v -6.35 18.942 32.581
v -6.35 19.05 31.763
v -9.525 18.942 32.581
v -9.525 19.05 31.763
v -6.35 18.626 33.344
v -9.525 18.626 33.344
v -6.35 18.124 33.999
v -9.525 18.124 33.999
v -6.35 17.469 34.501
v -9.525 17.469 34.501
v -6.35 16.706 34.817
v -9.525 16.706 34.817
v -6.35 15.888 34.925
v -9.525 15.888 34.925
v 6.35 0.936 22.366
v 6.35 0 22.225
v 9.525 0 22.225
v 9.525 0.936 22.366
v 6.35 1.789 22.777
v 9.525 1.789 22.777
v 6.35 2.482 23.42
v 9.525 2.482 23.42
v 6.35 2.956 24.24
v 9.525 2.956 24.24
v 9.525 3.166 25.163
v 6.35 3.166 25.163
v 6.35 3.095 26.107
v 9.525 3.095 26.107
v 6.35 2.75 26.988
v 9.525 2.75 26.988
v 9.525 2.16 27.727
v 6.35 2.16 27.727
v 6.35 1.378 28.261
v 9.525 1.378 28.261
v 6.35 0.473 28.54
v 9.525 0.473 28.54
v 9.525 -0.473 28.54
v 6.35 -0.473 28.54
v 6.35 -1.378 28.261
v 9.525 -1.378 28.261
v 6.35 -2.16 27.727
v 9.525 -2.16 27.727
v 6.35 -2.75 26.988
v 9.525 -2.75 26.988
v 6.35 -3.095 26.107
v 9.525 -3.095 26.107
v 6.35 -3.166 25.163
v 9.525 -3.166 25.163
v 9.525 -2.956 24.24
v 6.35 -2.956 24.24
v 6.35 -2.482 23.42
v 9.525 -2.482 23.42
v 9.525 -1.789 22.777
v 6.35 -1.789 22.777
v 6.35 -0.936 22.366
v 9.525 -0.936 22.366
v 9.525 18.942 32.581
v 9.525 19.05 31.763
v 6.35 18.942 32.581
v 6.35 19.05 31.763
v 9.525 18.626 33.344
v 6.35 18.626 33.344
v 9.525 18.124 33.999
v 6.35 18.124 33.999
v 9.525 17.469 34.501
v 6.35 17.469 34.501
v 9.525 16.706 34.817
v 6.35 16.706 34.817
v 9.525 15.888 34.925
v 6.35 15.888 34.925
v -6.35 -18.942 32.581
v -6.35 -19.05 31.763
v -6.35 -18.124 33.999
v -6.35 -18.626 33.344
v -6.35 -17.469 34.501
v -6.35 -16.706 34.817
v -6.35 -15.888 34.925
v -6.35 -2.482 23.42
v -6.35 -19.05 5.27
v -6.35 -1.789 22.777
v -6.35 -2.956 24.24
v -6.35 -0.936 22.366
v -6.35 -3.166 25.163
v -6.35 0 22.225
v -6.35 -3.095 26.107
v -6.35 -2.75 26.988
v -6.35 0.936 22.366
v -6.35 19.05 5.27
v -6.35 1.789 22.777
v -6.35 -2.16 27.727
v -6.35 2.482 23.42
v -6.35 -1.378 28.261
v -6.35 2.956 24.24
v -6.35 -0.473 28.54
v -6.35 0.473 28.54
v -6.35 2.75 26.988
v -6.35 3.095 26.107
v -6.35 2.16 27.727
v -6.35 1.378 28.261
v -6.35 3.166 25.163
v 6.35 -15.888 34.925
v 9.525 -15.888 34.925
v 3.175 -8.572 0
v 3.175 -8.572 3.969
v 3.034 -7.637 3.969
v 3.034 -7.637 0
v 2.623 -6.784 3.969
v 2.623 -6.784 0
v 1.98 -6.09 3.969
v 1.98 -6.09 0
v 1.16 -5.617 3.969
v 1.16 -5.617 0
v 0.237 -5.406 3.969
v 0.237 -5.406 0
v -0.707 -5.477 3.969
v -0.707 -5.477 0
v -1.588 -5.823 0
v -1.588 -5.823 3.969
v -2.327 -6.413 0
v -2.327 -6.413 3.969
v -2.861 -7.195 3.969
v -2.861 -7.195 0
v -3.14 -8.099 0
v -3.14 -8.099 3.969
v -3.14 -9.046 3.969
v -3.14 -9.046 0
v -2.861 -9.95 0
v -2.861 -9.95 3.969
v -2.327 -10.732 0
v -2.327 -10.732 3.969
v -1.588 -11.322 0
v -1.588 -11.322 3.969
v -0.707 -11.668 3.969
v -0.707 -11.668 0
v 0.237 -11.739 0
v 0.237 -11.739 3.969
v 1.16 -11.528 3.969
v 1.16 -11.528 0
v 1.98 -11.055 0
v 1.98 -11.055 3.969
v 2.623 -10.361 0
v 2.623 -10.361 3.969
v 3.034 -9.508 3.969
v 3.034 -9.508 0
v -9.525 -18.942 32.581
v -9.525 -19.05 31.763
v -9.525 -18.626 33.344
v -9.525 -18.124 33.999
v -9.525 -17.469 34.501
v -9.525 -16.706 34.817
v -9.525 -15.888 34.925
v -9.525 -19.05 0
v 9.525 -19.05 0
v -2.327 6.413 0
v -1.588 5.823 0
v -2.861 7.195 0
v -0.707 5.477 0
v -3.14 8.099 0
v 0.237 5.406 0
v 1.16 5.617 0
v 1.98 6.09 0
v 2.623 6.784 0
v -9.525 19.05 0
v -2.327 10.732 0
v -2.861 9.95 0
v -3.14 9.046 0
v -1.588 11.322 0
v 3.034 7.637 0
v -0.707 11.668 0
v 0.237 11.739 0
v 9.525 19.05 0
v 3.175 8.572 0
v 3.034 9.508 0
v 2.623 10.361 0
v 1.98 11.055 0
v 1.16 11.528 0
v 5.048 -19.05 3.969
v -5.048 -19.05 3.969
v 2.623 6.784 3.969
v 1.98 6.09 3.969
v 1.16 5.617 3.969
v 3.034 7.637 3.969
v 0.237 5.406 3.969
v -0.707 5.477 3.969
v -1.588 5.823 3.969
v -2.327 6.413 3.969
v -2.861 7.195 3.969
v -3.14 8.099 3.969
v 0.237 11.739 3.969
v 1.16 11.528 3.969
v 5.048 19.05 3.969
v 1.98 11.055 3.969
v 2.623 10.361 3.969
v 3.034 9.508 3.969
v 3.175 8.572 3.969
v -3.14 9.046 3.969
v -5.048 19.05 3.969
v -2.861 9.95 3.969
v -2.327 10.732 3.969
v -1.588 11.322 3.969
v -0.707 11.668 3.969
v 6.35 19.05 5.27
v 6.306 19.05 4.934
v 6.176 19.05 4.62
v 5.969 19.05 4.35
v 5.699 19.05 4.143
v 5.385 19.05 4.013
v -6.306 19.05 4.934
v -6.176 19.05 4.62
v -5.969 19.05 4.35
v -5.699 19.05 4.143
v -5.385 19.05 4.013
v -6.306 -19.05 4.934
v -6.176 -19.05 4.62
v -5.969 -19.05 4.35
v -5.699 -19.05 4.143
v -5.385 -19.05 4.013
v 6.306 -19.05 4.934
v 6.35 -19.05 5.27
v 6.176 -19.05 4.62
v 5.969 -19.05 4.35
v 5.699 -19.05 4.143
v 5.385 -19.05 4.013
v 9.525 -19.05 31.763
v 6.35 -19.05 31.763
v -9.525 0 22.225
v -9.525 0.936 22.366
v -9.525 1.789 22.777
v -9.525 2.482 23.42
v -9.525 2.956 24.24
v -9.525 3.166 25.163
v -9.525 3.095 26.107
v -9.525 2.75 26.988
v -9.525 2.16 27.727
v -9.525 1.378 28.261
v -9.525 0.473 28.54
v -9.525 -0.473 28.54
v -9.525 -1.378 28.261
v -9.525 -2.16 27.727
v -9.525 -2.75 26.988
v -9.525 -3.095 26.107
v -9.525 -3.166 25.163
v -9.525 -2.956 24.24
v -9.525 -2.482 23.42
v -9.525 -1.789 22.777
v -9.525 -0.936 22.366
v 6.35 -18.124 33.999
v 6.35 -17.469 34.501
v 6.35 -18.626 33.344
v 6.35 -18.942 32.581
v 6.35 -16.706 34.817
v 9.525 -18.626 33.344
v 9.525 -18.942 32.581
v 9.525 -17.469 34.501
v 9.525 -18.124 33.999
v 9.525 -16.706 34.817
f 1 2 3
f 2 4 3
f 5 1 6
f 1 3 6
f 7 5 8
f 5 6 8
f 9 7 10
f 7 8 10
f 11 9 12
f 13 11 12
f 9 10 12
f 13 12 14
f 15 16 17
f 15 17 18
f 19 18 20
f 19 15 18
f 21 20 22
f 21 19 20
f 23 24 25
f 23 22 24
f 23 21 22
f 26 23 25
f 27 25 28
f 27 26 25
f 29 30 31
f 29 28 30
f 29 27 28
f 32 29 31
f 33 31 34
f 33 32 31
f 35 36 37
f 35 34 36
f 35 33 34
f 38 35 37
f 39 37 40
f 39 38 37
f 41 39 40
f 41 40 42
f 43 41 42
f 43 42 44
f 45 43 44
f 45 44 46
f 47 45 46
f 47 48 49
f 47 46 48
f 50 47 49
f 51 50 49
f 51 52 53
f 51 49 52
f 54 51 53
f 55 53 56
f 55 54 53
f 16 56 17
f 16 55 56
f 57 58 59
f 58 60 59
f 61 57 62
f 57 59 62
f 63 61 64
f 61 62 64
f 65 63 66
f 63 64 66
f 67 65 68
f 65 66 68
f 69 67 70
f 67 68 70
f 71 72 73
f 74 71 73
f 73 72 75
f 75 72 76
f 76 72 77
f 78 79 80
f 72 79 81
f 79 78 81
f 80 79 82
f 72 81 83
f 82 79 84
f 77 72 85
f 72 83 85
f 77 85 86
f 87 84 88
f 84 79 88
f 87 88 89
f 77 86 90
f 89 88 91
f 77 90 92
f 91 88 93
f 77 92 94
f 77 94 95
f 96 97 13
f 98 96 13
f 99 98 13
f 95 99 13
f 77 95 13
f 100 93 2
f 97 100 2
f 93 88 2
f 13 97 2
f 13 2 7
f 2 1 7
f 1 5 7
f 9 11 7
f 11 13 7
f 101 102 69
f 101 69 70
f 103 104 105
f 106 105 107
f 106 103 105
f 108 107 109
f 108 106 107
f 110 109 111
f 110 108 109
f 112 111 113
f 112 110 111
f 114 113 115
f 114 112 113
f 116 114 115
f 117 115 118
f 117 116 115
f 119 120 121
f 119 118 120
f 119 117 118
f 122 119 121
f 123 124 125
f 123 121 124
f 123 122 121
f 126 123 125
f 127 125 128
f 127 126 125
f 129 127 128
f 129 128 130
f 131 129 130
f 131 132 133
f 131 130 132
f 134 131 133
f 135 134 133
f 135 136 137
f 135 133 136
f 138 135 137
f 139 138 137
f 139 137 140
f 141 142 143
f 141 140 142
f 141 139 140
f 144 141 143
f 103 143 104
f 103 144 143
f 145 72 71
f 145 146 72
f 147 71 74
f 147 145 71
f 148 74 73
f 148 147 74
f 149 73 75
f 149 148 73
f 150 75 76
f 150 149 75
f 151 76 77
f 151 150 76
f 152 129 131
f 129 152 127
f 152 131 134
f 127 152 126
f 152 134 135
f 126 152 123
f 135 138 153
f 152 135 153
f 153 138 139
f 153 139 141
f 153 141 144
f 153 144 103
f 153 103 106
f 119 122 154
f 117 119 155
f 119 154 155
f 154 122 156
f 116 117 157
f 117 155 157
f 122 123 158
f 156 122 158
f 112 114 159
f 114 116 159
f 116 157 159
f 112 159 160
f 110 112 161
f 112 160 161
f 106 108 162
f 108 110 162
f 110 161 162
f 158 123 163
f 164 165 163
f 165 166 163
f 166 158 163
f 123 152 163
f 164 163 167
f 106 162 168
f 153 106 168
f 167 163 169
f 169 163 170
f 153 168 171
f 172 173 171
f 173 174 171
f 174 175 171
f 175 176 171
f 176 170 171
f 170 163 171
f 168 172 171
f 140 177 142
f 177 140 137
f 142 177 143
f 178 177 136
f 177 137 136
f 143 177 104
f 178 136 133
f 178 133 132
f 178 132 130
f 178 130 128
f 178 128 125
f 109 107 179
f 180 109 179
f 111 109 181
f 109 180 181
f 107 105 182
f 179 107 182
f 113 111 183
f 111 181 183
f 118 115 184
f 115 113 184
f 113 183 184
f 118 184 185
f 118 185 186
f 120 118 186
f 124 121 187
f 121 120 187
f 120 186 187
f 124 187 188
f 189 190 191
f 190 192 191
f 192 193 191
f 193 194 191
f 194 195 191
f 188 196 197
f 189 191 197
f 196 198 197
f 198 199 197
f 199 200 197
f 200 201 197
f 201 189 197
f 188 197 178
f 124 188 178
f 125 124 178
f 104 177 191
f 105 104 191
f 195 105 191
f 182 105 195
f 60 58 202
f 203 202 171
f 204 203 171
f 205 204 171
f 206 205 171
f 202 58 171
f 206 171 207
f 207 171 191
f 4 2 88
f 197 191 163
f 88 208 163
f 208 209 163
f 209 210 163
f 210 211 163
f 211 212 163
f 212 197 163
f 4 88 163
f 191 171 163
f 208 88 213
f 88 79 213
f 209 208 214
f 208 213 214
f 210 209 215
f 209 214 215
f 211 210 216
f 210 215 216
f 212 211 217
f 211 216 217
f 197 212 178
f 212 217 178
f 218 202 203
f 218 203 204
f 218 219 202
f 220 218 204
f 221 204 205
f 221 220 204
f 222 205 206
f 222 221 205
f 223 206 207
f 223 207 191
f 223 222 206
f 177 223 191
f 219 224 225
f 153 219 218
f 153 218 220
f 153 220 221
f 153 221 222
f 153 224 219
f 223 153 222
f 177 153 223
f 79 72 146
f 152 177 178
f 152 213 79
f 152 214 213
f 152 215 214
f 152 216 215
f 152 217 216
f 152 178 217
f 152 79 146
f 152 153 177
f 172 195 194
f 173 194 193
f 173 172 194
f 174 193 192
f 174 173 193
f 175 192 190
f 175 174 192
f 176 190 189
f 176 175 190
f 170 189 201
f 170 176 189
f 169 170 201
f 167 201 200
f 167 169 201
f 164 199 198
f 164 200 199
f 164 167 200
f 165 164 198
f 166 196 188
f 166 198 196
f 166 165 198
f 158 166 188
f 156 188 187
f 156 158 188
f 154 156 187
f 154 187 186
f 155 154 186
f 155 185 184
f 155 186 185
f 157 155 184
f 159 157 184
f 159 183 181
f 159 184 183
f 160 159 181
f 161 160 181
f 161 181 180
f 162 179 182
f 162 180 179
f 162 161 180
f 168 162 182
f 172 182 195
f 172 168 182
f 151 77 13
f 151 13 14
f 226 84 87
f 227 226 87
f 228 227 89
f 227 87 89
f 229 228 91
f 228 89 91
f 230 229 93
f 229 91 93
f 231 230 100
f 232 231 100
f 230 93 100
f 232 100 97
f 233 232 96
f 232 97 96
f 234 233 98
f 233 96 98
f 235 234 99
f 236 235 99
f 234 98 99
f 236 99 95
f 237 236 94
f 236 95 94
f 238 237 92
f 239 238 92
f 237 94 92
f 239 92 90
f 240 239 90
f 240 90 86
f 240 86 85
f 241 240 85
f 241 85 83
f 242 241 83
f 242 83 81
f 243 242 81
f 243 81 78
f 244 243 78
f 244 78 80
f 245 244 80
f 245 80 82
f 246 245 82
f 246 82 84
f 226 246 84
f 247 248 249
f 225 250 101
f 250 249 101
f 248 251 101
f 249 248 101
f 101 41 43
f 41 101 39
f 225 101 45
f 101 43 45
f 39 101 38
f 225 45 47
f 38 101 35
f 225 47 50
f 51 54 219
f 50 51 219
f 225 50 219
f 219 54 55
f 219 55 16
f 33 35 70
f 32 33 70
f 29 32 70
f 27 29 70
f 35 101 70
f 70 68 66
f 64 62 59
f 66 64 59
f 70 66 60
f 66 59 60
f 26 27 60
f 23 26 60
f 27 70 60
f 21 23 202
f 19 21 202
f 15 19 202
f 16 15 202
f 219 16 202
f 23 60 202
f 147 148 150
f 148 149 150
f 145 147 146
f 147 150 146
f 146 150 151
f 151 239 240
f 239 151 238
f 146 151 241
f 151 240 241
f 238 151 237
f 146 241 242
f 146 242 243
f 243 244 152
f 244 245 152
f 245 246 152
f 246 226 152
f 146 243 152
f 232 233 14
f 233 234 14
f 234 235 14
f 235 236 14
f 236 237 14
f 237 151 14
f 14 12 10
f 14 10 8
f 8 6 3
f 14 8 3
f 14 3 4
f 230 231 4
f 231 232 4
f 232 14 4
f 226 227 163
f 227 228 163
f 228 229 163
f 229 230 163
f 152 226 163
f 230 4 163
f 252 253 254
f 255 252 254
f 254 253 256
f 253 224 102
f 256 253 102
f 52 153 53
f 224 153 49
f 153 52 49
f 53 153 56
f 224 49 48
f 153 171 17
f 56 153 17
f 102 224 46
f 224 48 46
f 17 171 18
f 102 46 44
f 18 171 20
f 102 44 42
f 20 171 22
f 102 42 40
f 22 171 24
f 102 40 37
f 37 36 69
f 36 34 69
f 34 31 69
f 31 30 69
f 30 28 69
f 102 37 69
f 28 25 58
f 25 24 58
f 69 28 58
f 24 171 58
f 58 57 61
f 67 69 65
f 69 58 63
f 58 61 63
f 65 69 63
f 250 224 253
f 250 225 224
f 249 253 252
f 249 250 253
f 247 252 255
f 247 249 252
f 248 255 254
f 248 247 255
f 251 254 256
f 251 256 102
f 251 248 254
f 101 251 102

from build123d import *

# Parameters (mm, degrees)
EXTRUDE1_DEPTH      = 19.05
SKETCH2_R           = 3.175
EXTRUDE2_DEPTH      = 35.925
SKETCH3_R           = 3.175
EXTRUDE3_DEPTH      = 10.525
EXTRUDE3_DEPTH_BACK = 10.525
FILLET3_R           = 3.1623
FILLET4_R           = 1.30175


with BuildPart() as part:
    # Sketch1 → Extrude1 (new body, symmetric)
    with BuildSketch(Plane(origin=(0, 0, 0), x_dir=(1, 0, 0), z_dir=(0, 1, 0))):
        Polygon((-9.525, 0), (9.525, 0), (9.525, -34.925), (6.35, -34.925), (6.35, -3.96875), (-6.35, -3.96875), (-6.35, -34.925), (-9.525, -34.925), align=None)
    extrude(amount=EXTRUDE1_DEPTH, both=True)

    # Sketch2 → Extrude2 (cut, through all)
    with BuildSketch(Plane.XY):
        with Locations((0, -8.5725)):
            Circle(SKETCH2_R)
        with Locations((0, 8.5725)):
            Circle(SKETCH2_R)
    extrude(amount=EXTRUDE2_DEPTH, mode=Mode.SUBTRACT)

    # Sketch3 → Extrude3 (cut, two sides)
    with BuildSketch(Plane(origin=(0, 0, -0.669808337), x_dir=(0, 0, -1), z_dir=(1, 0, 0))) as extrude3_sk:
        with Locations((-26.069808337, 0)):
            Circle(SKETCH3_R)
    extrude(amount=EXTRUDE3_DEPTH, mode=Mode.SUBTRACT)
    extrude(extrude3_sk.sketch, amount=-EXTRUDE3_DEPTH_BACK, mode=Mode.SUBTRACT)

    # Fillet3
    fillet3_edges = [part.edges().sort_by_distance(p)[0] for p in [
        (-7.9375, 19.05, 34.925),
        (7.9375, 19.05, 34.925),
        (7.9375, -19.05, 34.925),
        (-7.9375, -19.05, 34.925),
    ]]
    fillet(fillet3_edges, radius=FILLET3_R)

    # Fillet4
    fillet4_edges = [part.edges().sort_by_distance(p)[0] for p in [
        (6.35, 0, 3.96875),
        (-6.35, 0, 3.96875),
    ]]
    fillet(fillet4_edges, radius=FILLET4_R)


solid = part.part
